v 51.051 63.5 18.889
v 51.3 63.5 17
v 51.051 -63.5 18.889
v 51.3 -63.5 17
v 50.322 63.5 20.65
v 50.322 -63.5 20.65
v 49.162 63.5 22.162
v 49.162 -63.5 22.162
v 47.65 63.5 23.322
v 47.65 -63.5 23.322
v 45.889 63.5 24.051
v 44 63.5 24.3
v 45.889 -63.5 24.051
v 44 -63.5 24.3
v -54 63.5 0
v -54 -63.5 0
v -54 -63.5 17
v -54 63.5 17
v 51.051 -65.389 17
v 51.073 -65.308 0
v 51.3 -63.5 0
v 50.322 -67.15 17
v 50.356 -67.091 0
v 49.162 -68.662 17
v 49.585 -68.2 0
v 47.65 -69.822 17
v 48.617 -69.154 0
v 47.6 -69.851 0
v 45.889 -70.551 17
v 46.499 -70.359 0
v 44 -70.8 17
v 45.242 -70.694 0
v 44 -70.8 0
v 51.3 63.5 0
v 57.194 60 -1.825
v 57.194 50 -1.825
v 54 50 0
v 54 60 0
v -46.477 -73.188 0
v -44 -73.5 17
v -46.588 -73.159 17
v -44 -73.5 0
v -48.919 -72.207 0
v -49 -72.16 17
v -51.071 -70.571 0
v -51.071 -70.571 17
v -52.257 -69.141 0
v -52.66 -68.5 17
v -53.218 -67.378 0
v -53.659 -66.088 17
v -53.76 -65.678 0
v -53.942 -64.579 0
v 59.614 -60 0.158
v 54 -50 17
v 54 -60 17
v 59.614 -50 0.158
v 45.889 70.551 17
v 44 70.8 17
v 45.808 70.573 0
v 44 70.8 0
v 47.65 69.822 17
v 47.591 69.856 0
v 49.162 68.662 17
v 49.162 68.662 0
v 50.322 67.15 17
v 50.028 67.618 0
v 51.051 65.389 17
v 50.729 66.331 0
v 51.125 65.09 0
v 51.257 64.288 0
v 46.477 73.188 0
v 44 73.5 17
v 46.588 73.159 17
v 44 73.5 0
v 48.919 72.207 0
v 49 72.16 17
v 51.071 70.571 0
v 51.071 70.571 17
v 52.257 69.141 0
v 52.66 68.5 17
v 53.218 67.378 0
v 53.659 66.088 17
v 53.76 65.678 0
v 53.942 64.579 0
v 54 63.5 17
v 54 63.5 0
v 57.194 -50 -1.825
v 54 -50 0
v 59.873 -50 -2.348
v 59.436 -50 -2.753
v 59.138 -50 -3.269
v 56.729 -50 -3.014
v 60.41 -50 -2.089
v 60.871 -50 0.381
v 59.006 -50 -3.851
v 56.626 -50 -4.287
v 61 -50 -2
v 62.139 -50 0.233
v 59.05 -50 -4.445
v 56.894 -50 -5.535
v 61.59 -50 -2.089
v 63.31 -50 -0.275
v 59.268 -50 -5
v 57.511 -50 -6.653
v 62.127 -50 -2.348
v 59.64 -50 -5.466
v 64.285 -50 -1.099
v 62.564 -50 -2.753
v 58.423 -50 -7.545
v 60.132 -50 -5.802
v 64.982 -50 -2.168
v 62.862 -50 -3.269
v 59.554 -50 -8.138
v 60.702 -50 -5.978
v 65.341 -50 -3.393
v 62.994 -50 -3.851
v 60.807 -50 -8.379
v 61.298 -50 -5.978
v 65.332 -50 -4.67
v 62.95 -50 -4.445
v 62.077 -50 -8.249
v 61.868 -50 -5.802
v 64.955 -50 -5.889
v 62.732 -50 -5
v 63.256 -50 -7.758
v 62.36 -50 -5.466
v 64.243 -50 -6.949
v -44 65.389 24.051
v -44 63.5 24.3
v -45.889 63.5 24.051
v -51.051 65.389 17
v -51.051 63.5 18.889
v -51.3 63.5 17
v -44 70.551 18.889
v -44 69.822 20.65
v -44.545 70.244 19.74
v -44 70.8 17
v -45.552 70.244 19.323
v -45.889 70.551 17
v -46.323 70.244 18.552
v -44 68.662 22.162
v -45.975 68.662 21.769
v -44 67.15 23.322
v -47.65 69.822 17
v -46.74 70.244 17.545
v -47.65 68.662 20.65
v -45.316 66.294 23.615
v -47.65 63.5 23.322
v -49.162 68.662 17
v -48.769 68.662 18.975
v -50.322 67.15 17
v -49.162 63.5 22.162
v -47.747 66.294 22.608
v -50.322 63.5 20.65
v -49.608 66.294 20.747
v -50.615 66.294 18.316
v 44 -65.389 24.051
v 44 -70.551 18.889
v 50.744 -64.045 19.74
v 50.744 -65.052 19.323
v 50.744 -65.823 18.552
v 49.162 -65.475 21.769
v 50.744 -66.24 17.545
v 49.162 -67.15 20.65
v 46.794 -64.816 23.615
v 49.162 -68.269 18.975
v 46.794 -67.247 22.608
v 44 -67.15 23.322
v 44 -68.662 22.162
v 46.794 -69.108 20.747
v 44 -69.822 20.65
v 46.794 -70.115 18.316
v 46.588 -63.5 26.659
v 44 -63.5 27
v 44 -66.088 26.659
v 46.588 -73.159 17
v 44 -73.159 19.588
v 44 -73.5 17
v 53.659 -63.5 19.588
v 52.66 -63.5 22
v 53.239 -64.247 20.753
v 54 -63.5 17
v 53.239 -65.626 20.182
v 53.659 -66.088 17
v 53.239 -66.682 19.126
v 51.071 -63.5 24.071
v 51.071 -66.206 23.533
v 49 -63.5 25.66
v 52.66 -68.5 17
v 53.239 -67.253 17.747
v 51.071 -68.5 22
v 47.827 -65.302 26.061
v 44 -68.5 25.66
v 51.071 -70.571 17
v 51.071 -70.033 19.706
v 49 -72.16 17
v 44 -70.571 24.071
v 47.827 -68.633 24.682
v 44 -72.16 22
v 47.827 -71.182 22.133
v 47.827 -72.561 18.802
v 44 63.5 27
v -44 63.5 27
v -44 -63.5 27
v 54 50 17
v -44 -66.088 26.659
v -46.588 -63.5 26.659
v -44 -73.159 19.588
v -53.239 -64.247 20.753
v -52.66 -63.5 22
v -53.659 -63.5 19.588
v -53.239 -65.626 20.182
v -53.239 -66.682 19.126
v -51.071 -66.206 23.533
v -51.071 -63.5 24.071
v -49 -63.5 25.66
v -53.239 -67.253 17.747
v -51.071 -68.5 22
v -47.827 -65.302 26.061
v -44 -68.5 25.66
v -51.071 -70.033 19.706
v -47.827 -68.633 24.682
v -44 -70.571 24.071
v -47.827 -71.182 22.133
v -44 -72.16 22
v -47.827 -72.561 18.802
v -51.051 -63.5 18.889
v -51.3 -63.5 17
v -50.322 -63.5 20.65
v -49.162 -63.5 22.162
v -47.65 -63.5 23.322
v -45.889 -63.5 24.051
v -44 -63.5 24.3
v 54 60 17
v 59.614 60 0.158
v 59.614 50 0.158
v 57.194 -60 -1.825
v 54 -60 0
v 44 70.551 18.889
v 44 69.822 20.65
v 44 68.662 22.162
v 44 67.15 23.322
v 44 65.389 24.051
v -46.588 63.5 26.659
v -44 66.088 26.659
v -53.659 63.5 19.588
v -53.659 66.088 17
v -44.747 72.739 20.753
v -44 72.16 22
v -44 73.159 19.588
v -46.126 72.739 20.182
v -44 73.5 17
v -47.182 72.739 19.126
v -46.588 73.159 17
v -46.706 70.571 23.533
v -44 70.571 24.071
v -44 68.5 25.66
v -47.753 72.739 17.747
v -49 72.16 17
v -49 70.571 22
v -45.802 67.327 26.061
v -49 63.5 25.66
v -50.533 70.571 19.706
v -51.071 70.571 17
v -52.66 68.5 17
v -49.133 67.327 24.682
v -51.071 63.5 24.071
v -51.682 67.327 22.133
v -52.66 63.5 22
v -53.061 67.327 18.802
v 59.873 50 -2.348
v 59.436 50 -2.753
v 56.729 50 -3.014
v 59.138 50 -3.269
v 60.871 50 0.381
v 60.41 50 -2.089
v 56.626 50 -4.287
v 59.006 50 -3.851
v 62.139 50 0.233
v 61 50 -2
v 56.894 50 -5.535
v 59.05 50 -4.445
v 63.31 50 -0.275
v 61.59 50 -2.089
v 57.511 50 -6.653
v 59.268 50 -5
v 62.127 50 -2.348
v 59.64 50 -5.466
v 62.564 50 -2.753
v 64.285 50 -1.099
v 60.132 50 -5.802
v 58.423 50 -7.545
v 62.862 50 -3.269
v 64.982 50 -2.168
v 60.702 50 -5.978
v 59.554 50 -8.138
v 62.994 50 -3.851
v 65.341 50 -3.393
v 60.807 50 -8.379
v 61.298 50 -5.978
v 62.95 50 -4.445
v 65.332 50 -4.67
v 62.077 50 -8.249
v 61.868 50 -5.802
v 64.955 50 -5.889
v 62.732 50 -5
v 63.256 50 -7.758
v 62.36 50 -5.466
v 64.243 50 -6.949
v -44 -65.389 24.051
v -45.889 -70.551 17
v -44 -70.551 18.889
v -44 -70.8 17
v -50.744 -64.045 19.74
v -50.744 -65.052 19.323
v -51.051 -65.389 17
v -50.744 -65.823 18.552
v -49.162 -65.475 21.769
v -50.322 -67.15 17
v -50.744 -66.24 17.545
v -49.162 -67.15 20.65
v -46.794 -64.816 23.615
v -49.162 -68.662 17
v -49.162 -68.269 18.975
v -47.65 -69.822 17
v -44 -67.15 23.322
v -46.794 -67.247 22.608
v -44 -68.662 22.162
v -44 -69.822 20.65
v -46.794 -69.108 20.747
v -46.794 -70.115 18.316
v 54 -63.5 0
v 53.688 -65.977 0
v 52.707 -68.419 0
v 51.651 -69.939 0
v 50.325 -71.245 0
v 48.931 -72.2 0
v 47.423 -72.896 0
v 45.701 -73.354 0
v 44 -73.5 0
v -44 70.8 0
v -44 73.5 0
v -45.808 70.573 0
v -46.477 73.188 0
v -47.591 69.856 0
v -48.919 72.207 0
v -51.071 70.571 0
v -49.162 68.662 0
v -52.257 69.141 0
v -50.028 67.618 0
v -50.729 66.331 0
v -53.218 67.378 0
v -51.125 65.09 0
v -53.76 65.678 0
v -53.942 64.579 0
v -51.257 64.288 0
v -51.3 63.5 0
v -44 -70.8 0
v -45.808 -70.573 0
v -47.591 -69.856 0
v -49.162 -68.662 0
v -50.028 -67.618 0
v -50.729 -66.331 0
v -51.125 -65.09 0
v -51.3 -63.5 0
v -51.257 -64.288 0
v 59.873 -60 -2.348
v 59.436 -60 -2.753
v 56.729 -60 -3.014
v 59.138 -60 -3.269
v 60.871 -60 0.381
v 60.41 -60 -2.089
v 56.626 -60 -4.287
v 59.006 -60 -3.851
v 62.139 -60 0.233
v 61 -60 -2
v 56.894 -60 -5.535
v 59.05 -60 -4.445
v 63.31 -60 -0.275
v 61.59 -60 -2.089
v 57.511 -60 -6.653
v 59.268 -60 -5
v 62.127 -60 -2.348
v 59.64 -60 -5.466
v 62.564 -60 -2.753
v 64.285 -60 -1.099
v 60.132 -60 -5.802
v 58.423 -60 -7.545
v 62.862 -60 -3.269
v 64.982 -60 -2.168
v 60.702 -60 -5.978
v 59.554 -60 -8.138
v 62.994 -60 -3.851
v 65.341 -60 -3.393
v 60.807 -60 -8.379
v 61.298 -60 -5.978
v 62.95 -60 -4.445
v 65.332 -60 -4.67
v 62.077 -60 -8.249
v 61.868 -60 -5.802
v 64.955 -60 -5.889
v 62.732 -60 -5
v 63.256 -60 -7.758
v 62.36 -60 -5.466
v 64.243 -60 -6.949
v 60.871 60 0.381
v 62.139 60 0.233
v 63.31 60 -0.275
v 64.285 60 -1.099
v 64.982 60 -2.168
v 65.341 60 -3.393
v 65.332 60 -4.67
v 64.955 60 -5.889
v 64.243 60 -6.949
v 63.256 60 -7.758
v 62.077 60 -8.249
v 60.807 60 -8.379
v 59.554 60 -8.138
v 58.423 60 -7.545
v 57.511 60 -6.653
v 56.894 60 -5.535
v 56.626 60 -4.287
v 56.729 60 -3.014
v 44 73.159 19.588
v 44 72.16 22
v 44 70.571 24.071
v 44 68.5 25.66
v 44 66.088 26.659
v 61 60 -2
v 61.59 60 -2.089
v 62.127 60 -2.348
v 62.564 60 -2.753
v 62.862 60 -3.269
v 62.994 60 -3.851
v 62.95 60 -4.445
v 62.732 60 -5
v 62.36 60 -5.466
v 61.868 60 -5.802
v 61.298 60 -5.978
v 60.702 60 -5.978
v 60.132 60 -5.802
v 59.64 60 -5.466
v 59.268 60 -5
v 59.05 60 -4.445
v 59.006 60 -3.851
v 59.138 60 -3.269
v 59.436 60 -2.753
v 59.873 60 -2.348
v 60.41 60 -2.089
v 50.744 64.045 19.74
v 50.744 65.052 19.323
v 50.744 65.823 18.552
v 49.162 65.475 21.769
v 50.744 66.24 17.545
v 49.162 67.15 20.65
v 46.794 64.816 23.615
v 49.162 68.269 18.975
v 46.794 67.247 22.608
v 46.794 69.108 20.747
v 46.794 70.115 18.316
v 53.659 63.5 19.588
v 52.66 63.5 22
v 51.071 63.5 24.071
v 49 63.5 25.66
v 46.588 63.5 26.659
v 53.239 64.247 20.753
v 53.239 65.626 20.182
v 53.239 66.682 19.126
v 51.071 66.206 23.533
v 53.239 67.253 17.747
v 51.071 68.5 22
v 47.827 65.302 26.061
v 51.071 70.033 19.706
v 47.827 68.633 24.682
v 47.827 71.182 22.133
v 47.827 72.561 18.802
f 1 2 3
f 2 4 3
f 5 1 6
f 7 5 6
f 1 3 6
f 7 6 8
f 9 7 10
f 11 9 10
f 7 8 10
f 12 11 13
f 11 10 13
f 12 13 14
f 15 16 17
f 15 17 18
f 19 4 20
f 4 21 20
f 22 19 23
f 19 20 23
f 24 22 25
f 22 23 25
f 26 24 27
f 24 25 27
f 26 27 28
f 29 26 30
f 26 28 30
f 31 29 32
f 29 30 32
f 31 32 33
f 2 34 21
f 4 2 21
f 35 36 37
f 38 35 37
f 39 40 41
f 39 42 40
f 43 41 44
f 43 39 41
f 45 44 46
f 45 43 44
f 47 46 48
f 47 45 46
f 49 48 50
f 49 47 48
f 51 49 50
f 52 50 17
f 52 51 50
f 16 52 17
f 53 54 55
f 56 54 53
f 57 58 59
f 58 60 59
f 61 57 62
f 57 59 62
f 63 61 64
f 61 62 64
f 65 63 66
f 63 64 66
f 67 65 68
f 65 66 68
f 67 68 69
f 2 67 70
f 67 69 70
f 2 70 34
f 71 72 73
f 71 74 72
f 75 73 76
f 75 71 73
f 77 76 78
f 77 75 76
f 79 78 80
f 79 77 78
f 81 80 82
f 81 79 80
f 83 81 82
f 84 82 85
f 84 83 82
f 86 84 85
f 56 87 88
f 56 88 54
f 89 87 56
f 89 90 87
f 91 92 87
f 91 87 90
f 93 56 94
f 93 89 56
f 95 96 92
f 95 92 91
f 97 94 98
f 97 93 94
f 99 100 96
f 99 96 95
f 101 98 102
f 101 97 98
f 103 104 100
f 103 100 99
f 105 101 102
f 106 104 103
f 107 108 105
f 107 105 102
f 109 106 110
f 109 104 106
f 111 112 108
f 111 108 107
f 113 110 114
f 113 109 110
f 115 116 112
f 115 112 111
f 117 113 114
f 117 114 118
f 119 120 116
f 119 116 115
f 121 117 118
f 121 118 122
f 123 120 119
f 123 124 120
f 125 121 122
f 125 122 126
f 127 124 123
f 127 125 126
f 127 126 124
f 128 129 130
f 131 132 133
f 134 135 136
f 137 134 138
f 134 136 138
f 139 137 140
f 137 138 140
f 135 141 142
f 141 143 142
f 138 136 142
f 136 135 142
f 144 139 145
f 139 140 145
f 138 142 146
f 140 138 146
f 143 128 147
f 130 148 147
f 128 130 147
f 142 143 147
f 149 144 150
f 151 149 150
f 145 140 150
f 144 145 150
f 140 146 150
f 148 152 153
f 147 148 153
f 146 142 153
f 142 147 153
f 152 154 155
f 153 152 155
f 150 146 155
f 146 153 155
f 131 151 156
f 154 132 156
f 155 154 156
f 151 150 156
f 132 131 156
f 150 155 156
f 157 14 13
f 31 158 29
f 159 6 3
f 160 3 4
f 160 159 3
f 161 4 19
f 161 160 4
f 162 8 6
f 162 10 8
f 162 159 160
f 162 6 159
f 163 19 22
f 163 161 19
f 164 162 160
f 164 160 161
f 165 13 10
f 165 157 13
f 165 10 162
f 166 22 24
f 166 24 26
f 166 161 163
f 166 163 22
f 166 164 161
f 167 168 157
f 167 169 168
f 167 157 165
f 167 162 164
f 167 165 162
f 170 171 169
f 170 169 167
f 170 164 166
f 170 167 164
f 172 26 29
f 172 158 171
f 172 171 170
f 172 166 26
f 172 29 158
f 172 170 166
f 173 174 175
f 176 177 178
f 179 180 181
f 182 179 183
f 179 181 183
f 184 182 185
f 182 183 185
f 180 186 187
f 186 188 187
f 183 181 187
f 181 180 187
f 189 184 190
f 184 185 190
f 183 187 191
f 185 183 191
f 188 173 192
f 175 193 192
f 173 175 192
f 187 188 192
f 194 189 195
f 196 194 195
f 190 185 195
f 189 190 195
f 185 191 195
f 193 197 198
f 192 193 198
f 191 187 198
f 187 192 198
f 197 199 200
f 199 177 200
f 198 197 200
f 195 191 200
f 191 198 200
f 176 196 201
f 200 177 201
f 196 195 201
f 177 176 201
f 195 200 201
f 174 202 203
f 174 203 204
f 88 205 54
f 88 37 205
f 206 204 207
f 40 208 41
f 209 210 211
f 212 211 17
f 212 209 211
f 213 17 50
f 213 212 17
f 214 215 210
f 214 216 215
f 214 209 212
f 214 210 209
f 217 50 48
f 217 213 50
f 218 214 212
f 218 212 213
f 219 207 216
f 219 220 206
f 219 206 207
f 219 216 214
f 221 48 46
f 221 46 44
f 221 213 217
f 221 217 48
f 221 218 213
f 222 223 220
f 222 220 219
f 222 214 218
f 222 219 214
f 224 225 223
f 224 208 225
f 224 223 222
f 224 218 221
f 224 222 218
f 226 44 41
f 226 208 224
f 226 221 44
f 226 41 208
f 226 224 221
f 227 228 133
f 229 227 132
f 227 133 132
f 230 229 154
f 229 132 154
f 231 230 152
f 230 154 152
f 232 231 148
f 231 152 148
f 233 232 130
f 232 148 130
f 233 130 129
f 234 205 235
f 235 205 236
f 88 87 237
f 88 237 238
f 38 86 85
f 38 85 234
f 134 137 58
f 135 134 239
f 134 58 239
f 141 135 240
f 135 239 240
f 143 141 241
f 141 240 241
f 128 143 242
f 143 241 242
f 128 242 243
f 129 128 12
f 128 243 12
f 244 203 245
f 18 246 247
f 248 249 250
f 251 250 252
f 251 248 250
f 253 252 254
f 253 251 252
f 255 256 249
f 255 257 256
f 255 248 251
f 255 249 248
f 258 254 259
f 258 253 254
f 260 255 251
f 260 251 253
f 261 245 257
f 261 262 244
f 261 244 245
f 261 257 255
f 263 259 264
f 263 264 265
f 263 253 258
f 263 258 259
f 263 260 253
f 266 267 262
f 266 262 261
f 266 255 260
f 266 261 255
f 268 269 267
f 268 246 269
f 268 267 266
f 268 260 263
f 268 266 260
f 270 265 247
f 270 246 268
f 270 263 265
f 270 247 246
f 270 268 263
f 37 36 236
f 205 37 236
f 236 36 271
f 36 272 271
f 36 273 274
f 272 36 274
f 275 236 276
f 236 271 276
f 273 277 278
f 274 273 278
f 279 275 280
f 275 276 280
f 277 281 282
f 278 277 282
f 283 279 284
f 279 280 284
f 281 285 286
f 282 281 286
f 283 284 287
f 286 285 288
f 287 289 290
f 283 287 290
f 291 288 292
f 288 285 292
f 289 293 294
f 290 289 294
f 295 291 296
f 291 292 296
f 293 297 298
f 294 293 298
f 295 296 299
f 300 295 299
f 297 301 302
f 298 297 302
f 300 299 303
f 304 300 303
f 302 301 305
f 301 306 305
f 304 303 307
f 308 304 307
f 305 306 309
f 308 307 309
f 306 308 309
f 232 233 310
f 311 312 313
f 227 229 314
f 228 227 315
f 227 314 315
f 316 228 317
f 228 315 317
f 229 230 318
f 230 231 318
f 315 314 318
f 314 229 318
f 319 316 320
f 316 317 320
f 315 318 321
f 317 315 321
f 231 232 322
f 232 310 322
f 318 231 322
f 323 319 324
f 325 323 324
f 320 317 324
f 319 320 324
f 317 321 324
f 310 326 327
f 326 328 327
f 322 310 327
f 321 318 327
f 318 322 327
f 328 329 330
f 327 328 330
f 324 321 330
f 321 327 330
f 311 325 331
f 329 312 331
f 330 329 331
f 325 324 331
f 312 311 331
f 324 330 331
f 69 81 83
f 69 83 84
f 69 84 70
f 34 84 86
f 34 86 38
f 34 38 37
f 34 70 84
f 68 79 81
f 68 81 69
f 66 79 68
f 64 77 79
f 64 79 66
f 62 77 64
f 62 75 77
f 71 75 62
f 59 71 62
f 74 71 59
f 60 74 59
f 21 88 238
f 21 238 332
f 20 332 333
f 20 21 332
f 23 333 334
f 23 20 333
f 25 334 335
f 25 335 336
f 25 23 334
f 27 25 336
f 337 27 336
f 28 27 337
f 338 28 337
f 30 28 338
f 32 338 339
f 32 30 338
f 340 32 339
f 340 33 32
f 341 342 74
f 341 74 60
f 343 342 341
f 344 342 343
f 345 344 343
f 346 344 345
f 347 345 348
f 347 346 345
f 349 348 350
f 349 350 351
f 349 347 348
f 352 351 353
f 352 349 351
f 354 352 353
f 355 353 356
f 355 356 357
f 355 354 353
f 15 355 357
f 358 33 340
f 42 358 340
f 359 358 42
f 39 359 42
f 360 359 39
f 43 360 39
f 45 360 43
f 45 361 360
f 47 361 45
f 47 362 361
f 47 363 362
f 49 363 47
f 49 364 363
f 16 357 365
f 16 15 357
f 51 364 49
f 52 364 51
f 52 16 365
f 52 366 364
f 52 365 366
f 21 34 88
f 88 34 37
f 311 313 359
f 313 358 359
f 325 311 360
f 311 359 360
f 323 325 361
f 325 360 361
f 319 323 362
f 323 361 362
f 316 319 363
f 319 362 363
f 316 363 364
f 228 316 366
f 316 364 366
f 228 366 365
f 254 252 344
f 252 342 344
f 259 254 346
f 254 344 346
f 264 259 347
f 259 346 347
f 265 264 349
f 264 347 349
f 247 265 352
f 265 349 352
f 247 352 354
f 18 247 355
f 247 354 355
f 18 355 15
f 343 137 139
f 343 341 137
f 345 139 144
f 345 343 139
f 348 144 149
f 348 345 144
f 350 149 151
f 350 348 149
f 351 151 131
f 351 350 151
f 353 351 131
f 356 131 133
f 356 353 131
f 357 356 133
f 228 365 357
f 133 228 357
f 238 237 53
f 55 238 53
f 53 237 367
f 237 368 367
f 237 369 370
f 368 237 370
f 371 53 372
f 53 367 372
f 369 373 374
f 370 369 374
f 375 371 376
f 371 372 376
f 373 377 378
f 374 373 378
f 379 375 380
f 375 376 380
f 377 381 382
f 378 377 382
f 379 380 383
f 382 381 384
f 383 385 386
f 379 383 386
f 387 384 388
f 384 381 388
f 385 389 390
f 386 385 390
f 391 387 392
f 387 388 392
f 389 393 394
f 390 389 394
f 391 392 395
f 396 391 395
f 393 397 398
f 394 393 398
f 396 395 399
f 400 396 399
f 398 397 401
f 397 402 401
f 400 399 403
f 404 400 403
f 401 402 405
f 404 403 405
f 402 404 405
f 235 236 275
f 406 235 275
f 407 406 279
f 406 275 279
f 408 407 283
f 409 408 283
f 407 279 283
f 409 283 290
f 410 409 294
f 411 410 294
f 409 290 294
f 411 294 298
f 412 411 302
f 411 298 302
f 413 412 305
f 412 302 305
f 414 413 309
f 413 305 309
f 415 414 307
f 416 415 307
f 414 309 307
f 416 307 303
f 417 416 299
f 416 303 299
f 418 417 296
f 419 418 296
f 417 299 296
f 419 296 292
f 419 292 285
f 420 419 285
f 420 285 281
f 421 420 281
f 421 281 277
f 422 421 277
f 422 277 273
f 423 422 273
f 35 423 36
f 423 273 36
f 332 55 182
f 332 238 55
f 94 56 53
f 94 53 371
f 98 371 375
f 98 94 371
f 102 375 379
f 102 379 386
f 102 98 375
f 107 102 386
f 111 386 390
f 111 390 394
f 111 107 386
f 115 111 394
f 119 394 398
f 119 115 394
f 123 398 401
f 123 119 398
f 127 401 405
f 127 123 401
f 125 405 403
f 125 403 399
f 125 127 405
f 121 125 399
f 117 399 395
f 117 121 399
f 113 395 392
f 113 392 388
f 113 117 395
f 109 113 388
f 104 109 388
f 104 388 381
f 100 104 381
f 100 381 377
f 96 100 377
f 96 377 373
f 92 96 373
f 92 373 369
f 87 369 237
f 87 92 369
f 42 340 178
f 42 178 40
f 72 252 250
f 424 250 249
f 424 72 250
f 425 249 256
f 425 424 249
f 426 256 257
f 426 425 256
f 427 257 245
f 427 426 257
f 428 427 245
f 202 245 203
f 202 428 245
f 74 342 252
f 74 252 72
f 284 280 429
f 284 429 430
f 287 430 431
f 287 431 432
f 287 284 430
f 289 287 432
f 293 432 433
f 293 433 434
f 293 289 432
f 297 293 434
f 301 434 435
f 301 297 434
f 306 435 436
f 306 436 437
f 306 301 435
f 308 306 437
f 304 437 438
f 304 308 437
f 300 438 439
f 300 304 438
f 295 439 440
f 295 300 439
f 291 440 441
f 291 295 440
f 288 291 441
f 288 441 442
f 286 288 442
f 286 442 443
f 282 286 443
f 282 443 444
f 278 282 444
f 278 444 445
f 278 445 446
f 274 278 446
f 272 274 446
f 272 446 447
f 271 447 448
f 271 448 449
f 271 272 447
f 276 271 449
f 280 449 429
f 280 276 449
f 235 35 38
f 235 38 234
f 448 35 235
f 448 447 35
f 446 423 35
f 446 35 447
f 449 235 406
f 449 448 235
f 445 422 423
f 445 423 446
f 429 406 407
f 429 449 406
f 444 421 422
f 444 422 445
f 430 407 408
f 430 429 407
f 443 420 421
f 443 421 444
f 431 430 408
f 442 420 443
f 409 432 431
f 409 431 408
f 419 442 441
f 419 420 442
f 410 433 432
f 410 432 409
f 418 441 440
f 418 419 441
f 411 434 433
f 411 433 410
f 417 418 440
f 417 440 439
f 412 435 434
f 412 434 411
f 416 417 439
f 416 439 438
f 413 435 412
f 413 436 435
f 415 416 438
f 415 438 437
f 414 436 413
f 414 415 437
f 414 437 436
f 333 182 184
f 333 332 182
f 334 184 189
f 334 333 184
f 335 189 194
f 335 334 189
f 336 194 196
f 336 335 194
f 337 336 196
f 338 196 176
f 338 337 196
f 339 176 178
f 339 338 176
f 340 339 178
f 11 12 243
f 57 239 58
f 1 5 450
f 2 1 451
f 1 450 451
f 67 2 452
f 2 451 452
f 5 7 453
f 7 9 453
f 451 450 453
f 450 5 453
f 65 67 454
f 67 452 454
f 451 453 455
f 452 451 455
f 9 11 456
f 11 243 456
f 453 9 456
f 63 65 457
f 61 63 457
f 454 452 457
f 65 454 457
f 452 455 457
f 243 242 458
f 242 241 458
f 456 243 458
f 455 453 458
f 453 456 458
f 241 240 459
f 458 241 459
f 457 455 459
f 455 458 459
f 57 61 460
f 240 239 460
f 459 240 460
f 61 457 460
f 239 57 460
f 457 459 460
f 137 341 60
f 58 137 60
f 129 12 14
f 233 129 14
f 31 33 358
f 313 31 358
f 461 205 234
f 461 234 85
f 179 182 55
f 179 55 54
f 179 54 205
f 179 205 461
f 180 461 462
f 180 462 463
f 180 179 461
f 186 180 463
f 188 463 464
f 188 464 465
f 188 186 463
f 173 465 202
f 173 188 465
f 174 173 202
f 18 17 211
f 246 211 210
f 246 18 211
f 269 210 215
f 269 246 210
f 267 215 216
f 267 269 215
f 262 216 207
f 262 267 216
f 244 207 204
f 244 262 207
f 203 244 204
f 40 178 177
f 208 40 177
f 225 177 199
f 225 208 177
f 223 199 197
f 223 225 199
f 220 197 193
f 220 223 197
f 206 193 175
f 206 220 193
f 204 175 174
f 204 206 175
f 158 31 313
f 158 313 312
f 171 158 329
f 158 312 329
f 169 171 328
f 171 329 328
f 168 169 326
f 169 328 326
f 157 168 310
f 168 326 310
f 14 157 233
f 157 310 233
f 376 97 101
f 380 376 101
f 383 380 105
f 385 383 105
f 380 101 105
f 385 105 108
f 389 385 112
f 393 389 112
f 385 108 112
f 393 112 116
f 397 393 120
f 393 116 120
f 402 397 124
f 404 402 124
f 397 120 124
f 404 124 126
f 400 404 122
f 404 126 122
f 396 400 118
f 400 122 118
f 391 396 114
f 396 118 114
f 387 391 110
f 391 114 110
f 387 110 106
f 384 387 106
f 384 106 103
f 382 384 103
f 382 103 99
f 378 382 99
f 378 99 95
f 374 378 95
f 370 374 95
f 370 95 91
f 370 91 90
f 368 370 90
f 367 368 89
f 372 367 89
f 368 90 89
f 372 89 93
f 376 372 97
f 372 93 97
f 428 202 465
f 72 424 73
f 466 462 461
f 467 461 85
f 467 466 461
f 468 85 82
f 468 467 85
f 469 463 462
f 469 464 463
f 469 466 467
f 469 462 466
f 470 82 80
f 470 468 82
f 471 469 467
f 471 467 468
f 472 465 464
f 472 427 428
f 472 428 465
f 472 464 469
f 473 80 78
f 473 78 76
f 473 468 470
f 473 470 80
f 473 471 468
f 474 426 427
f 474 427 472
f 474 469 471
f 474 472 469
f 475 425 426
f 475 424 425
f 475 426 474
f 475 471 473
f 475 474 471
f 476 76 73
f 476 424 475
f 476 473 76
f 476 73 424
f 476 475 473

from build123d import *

# Parameters (mm, degrees)
FILLET1_R           = 10
SHELL1_T            = -2.7
SKETCH4_R           = 2
BOSS_EXTRUDE1_DEPTH = 10


with BuildPart() as part:
    # Sketch2 → Loft1 section 0
    with BuildSketch(Plane.XY.offset(27)):
        with BuildLine():
            Line((-54, 73.5), (54, 73.5))
            Line((54, 73.5), (54, -73.5))
            Line((54, -73.5), (-54, -73.5))
            Line((-54, -73.5), (-54, 73.5))
        make_face()
    # Sketch1 → Loft1 section 1
    with BuildSketch(Plane.XY):
        with BuildLine():
            Line((54, 73.5), (-54, 73.5))
            Line((-54, 73.5), (-54, -73.5))
            Line((-54, -73.5), (54, -73.5))
            Line((54, -73.5), (54, 73.5))
        make_face()
    loft()

    # Fillet1
    fillet1_edges = [part.edges().sort_by_distance(p)[0] for p in [
        (0, -73.5, 27),
        (-54, 0, 27),
        (0, 73.5, 27),
        (54, 0, 27),
        (54, 73.5, 13.5),
        (-54, 73.5, 13.5),
        (-54, -73.5, 13.5),
        (54, -73.5, 13.5),
    ]]
    fillet(fillet1_edges, radius=FILLET1_R)

    # Shell1
    shell1_openings = [part.faces().sort_by_distance(p)[0] for p in [
        (9.6e-08, -7.1e-08, 0),
    ]]
    offset(amount=SHELL1_T, openings=shell1_openings)

    # Sketch4 → Boss-Extrude1 (add)
    with BuildSketch(Plane(origin=(0, 50, 0), x_dir=(1, 0, 0), z_dir=(0, 1, 0))):
        with BuildLine():
            Line((57.194341554, 1.825338031), (54, 0))
            Line((54, 0), (54, -17))
            Line((54, -17), (59.613919523, -0.158241431))
            ThreePointArc((59.613919523, -0.158241431), (63.778881993, 7.3896911), (57.194341554, 1.825338031))
        make_face()
        with Locations(Location((61, 4, 0), (0, 0, 270))):
            Circle(SKETCH4_R, mode=Mode.SUBTRACT)
    boss_extrude1 = extrude(amount=BOSS_EXTRUDE1_DEPTH)

    # Mirror1: Boss-Extrude1 across plane
    add(boss_extrude1.mirror(Plane.ZX))


solid = part.part
